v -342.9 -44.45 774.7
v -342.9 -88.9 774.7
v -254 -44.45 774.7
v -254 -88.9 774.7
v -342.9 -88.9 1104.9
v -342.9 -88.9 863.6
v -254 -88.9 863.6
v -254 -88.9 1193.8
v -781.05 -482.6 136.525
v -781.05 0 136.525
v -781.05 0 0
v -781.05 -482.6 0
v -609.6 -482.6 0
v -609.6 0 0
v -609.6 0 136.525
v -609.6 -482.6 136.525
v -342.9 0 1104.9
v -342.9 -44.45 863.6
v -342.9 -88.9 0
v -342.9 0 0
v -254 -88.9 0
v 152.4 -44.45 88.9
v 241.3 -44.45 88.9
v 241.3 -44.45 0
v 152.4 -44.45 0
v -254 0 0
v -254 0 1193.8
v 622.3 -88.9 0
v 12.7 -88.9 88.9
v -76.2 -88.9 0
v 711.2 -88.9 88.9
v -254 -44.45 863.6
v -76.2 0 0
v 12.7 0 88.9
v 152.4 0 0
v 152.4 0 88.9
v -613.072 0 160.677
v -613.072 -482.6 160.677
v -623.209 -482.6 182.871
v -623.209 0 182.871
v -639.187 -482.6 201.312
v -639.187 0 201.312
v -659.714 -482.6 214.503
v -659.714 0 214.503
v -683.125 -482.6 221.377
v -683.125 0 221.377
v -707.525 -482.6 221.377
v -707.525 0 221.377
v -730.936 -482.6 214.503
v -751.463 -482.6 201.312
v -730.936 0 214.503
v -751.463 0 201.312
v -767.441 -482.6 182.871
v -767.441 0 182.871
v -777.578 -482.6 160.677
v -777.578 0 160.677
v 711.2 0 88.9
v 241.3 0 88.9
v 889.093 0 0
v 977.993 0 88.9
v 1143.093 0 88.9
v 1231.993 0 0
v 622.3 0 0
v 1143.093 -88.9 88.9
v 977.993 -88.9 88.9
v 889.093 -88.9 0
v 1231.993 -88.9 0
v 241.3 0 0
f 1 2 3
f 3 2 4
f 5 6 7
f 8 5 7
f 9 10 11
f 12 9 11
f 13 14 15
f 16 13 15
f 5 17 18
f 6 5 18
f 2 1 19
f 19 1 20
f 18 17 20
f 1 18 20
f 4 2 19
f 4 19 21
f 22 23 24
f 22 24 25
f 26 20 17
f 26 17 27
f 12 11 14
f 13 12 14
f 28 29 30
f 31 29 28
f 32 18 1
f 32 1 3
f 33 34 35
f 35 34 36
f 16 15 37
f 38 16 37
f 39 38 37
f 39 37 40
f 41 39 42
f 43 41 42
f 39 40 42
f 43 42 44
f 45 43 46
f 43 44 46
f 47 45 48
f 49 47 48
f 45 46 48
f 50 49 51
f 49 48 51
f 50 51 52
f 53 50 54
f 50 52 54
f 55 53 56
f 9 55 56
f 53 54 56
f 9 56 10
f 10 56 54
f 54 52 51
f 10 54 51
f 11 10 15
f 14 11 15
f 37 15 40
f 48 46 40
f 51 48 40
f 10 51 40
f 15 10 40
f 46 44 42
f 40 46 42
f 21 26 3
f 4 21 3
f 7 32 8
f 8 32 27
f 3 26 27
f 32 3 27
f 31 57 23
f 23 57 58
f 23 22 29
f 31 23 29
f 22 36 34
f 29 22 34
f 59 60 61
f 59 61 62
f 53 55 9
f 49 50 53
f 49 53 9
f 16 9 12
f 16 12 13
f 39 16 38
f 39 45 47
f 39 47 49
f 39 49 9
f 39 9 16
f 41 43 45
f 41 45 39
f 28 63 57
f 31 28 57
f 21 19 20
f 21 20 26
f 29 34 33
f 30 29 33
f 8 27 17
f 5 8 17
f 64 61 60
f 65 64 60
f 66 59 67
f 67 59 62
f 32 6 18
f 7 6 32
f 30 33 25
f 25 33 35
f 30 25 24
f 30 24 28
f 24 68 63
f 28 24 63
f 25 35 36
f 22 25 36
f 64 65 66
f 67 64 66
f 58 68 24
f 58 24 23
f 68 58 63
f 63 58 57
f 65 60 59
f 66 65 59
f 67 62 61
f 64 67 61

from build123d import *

# Parameters (mm, degrees)
F1_DEPTH  = 482.6
F3_DEPTH  = 88.9
F4_W      = 88.9
F4_H      = 88.9
F5_DEPTH  = 44.45
F7_DEPTH  = 88.9
F8_W      = 88.9
F8_H      = 88.9
F9_DEPTH  = 44.45
F11_DEPTH = 88.9


with BuildPart() as f1:
    # F0 (on Front) → F1 (new body)
    with BuildSketch(Plane.XZ):
        with BuildLine():
            Line((-781.05, 136.525), (-781.05, 0))
            Line((-781.05, 0), (-609.6, 0))
            Line((-609.6, 0), (-609.6, 136.525))
            ThreePointArc((-609.6, 136.525), (-695.325, 222.25), (-781.05, 136.525))
        make_face()
    extrude(amount=F1_DEPTH)


with BuildPart() as f3:
    # F2 (on Front) → F3 (new body)
    with BuildSketch(Plane.XZ):
        Polygon((-342.9, 1104.9), (-342.9, 0), (-254, 0), (-254, 1193.8), align=None)
    extrude(amount=F3_DEPTH)

    # F4 (on face) → F5 (cut)
    with BuildSketch(Plane.XZ.offset(88.9)):
        with Locations((-298.45, 819.15)):
            Rectangle(F4_W, F4_H)
    extrude(amount=-F5_DEPTH, mode=Mode.SUBTRACT)


with BuildPart() as f7:
    # F6 (on Front) → F7 (new body)
    with BuildSketch(Plane.XZ):
        Polygon((12.7, 88.9), (-76.2, 0), (622.3, 0), (711.2, 88.9), align=None)
    extrude(amount=F7_DEPTH)

    # F8 (on face) → F9 (cut)
    with BuildSketch(Plane(origin=(0, 0, 0), x_dir=(-1, 0, 0), z_dir=(0, 1, 0))):
        with Locations((-196.85, 44.45)):
            Rectangle(F8_W, F8_H)
    extrude(amount=-F9_DEPTH, mode=Mode.SUBTRACT)


with BuildPart() as f11:
    # F10 (on Front) → F11 (new body)
    with BuildSketch(Plane.XZ):
        Polygon((977.993183, 88.9), (889.093183, 0), (1231.993183, 0), (1143.093183, 88.9), align=None)
    extrude(amount=F11_DEPTH)


solid = Compound([f1.part, f3.part, f7.part, f11.part])
